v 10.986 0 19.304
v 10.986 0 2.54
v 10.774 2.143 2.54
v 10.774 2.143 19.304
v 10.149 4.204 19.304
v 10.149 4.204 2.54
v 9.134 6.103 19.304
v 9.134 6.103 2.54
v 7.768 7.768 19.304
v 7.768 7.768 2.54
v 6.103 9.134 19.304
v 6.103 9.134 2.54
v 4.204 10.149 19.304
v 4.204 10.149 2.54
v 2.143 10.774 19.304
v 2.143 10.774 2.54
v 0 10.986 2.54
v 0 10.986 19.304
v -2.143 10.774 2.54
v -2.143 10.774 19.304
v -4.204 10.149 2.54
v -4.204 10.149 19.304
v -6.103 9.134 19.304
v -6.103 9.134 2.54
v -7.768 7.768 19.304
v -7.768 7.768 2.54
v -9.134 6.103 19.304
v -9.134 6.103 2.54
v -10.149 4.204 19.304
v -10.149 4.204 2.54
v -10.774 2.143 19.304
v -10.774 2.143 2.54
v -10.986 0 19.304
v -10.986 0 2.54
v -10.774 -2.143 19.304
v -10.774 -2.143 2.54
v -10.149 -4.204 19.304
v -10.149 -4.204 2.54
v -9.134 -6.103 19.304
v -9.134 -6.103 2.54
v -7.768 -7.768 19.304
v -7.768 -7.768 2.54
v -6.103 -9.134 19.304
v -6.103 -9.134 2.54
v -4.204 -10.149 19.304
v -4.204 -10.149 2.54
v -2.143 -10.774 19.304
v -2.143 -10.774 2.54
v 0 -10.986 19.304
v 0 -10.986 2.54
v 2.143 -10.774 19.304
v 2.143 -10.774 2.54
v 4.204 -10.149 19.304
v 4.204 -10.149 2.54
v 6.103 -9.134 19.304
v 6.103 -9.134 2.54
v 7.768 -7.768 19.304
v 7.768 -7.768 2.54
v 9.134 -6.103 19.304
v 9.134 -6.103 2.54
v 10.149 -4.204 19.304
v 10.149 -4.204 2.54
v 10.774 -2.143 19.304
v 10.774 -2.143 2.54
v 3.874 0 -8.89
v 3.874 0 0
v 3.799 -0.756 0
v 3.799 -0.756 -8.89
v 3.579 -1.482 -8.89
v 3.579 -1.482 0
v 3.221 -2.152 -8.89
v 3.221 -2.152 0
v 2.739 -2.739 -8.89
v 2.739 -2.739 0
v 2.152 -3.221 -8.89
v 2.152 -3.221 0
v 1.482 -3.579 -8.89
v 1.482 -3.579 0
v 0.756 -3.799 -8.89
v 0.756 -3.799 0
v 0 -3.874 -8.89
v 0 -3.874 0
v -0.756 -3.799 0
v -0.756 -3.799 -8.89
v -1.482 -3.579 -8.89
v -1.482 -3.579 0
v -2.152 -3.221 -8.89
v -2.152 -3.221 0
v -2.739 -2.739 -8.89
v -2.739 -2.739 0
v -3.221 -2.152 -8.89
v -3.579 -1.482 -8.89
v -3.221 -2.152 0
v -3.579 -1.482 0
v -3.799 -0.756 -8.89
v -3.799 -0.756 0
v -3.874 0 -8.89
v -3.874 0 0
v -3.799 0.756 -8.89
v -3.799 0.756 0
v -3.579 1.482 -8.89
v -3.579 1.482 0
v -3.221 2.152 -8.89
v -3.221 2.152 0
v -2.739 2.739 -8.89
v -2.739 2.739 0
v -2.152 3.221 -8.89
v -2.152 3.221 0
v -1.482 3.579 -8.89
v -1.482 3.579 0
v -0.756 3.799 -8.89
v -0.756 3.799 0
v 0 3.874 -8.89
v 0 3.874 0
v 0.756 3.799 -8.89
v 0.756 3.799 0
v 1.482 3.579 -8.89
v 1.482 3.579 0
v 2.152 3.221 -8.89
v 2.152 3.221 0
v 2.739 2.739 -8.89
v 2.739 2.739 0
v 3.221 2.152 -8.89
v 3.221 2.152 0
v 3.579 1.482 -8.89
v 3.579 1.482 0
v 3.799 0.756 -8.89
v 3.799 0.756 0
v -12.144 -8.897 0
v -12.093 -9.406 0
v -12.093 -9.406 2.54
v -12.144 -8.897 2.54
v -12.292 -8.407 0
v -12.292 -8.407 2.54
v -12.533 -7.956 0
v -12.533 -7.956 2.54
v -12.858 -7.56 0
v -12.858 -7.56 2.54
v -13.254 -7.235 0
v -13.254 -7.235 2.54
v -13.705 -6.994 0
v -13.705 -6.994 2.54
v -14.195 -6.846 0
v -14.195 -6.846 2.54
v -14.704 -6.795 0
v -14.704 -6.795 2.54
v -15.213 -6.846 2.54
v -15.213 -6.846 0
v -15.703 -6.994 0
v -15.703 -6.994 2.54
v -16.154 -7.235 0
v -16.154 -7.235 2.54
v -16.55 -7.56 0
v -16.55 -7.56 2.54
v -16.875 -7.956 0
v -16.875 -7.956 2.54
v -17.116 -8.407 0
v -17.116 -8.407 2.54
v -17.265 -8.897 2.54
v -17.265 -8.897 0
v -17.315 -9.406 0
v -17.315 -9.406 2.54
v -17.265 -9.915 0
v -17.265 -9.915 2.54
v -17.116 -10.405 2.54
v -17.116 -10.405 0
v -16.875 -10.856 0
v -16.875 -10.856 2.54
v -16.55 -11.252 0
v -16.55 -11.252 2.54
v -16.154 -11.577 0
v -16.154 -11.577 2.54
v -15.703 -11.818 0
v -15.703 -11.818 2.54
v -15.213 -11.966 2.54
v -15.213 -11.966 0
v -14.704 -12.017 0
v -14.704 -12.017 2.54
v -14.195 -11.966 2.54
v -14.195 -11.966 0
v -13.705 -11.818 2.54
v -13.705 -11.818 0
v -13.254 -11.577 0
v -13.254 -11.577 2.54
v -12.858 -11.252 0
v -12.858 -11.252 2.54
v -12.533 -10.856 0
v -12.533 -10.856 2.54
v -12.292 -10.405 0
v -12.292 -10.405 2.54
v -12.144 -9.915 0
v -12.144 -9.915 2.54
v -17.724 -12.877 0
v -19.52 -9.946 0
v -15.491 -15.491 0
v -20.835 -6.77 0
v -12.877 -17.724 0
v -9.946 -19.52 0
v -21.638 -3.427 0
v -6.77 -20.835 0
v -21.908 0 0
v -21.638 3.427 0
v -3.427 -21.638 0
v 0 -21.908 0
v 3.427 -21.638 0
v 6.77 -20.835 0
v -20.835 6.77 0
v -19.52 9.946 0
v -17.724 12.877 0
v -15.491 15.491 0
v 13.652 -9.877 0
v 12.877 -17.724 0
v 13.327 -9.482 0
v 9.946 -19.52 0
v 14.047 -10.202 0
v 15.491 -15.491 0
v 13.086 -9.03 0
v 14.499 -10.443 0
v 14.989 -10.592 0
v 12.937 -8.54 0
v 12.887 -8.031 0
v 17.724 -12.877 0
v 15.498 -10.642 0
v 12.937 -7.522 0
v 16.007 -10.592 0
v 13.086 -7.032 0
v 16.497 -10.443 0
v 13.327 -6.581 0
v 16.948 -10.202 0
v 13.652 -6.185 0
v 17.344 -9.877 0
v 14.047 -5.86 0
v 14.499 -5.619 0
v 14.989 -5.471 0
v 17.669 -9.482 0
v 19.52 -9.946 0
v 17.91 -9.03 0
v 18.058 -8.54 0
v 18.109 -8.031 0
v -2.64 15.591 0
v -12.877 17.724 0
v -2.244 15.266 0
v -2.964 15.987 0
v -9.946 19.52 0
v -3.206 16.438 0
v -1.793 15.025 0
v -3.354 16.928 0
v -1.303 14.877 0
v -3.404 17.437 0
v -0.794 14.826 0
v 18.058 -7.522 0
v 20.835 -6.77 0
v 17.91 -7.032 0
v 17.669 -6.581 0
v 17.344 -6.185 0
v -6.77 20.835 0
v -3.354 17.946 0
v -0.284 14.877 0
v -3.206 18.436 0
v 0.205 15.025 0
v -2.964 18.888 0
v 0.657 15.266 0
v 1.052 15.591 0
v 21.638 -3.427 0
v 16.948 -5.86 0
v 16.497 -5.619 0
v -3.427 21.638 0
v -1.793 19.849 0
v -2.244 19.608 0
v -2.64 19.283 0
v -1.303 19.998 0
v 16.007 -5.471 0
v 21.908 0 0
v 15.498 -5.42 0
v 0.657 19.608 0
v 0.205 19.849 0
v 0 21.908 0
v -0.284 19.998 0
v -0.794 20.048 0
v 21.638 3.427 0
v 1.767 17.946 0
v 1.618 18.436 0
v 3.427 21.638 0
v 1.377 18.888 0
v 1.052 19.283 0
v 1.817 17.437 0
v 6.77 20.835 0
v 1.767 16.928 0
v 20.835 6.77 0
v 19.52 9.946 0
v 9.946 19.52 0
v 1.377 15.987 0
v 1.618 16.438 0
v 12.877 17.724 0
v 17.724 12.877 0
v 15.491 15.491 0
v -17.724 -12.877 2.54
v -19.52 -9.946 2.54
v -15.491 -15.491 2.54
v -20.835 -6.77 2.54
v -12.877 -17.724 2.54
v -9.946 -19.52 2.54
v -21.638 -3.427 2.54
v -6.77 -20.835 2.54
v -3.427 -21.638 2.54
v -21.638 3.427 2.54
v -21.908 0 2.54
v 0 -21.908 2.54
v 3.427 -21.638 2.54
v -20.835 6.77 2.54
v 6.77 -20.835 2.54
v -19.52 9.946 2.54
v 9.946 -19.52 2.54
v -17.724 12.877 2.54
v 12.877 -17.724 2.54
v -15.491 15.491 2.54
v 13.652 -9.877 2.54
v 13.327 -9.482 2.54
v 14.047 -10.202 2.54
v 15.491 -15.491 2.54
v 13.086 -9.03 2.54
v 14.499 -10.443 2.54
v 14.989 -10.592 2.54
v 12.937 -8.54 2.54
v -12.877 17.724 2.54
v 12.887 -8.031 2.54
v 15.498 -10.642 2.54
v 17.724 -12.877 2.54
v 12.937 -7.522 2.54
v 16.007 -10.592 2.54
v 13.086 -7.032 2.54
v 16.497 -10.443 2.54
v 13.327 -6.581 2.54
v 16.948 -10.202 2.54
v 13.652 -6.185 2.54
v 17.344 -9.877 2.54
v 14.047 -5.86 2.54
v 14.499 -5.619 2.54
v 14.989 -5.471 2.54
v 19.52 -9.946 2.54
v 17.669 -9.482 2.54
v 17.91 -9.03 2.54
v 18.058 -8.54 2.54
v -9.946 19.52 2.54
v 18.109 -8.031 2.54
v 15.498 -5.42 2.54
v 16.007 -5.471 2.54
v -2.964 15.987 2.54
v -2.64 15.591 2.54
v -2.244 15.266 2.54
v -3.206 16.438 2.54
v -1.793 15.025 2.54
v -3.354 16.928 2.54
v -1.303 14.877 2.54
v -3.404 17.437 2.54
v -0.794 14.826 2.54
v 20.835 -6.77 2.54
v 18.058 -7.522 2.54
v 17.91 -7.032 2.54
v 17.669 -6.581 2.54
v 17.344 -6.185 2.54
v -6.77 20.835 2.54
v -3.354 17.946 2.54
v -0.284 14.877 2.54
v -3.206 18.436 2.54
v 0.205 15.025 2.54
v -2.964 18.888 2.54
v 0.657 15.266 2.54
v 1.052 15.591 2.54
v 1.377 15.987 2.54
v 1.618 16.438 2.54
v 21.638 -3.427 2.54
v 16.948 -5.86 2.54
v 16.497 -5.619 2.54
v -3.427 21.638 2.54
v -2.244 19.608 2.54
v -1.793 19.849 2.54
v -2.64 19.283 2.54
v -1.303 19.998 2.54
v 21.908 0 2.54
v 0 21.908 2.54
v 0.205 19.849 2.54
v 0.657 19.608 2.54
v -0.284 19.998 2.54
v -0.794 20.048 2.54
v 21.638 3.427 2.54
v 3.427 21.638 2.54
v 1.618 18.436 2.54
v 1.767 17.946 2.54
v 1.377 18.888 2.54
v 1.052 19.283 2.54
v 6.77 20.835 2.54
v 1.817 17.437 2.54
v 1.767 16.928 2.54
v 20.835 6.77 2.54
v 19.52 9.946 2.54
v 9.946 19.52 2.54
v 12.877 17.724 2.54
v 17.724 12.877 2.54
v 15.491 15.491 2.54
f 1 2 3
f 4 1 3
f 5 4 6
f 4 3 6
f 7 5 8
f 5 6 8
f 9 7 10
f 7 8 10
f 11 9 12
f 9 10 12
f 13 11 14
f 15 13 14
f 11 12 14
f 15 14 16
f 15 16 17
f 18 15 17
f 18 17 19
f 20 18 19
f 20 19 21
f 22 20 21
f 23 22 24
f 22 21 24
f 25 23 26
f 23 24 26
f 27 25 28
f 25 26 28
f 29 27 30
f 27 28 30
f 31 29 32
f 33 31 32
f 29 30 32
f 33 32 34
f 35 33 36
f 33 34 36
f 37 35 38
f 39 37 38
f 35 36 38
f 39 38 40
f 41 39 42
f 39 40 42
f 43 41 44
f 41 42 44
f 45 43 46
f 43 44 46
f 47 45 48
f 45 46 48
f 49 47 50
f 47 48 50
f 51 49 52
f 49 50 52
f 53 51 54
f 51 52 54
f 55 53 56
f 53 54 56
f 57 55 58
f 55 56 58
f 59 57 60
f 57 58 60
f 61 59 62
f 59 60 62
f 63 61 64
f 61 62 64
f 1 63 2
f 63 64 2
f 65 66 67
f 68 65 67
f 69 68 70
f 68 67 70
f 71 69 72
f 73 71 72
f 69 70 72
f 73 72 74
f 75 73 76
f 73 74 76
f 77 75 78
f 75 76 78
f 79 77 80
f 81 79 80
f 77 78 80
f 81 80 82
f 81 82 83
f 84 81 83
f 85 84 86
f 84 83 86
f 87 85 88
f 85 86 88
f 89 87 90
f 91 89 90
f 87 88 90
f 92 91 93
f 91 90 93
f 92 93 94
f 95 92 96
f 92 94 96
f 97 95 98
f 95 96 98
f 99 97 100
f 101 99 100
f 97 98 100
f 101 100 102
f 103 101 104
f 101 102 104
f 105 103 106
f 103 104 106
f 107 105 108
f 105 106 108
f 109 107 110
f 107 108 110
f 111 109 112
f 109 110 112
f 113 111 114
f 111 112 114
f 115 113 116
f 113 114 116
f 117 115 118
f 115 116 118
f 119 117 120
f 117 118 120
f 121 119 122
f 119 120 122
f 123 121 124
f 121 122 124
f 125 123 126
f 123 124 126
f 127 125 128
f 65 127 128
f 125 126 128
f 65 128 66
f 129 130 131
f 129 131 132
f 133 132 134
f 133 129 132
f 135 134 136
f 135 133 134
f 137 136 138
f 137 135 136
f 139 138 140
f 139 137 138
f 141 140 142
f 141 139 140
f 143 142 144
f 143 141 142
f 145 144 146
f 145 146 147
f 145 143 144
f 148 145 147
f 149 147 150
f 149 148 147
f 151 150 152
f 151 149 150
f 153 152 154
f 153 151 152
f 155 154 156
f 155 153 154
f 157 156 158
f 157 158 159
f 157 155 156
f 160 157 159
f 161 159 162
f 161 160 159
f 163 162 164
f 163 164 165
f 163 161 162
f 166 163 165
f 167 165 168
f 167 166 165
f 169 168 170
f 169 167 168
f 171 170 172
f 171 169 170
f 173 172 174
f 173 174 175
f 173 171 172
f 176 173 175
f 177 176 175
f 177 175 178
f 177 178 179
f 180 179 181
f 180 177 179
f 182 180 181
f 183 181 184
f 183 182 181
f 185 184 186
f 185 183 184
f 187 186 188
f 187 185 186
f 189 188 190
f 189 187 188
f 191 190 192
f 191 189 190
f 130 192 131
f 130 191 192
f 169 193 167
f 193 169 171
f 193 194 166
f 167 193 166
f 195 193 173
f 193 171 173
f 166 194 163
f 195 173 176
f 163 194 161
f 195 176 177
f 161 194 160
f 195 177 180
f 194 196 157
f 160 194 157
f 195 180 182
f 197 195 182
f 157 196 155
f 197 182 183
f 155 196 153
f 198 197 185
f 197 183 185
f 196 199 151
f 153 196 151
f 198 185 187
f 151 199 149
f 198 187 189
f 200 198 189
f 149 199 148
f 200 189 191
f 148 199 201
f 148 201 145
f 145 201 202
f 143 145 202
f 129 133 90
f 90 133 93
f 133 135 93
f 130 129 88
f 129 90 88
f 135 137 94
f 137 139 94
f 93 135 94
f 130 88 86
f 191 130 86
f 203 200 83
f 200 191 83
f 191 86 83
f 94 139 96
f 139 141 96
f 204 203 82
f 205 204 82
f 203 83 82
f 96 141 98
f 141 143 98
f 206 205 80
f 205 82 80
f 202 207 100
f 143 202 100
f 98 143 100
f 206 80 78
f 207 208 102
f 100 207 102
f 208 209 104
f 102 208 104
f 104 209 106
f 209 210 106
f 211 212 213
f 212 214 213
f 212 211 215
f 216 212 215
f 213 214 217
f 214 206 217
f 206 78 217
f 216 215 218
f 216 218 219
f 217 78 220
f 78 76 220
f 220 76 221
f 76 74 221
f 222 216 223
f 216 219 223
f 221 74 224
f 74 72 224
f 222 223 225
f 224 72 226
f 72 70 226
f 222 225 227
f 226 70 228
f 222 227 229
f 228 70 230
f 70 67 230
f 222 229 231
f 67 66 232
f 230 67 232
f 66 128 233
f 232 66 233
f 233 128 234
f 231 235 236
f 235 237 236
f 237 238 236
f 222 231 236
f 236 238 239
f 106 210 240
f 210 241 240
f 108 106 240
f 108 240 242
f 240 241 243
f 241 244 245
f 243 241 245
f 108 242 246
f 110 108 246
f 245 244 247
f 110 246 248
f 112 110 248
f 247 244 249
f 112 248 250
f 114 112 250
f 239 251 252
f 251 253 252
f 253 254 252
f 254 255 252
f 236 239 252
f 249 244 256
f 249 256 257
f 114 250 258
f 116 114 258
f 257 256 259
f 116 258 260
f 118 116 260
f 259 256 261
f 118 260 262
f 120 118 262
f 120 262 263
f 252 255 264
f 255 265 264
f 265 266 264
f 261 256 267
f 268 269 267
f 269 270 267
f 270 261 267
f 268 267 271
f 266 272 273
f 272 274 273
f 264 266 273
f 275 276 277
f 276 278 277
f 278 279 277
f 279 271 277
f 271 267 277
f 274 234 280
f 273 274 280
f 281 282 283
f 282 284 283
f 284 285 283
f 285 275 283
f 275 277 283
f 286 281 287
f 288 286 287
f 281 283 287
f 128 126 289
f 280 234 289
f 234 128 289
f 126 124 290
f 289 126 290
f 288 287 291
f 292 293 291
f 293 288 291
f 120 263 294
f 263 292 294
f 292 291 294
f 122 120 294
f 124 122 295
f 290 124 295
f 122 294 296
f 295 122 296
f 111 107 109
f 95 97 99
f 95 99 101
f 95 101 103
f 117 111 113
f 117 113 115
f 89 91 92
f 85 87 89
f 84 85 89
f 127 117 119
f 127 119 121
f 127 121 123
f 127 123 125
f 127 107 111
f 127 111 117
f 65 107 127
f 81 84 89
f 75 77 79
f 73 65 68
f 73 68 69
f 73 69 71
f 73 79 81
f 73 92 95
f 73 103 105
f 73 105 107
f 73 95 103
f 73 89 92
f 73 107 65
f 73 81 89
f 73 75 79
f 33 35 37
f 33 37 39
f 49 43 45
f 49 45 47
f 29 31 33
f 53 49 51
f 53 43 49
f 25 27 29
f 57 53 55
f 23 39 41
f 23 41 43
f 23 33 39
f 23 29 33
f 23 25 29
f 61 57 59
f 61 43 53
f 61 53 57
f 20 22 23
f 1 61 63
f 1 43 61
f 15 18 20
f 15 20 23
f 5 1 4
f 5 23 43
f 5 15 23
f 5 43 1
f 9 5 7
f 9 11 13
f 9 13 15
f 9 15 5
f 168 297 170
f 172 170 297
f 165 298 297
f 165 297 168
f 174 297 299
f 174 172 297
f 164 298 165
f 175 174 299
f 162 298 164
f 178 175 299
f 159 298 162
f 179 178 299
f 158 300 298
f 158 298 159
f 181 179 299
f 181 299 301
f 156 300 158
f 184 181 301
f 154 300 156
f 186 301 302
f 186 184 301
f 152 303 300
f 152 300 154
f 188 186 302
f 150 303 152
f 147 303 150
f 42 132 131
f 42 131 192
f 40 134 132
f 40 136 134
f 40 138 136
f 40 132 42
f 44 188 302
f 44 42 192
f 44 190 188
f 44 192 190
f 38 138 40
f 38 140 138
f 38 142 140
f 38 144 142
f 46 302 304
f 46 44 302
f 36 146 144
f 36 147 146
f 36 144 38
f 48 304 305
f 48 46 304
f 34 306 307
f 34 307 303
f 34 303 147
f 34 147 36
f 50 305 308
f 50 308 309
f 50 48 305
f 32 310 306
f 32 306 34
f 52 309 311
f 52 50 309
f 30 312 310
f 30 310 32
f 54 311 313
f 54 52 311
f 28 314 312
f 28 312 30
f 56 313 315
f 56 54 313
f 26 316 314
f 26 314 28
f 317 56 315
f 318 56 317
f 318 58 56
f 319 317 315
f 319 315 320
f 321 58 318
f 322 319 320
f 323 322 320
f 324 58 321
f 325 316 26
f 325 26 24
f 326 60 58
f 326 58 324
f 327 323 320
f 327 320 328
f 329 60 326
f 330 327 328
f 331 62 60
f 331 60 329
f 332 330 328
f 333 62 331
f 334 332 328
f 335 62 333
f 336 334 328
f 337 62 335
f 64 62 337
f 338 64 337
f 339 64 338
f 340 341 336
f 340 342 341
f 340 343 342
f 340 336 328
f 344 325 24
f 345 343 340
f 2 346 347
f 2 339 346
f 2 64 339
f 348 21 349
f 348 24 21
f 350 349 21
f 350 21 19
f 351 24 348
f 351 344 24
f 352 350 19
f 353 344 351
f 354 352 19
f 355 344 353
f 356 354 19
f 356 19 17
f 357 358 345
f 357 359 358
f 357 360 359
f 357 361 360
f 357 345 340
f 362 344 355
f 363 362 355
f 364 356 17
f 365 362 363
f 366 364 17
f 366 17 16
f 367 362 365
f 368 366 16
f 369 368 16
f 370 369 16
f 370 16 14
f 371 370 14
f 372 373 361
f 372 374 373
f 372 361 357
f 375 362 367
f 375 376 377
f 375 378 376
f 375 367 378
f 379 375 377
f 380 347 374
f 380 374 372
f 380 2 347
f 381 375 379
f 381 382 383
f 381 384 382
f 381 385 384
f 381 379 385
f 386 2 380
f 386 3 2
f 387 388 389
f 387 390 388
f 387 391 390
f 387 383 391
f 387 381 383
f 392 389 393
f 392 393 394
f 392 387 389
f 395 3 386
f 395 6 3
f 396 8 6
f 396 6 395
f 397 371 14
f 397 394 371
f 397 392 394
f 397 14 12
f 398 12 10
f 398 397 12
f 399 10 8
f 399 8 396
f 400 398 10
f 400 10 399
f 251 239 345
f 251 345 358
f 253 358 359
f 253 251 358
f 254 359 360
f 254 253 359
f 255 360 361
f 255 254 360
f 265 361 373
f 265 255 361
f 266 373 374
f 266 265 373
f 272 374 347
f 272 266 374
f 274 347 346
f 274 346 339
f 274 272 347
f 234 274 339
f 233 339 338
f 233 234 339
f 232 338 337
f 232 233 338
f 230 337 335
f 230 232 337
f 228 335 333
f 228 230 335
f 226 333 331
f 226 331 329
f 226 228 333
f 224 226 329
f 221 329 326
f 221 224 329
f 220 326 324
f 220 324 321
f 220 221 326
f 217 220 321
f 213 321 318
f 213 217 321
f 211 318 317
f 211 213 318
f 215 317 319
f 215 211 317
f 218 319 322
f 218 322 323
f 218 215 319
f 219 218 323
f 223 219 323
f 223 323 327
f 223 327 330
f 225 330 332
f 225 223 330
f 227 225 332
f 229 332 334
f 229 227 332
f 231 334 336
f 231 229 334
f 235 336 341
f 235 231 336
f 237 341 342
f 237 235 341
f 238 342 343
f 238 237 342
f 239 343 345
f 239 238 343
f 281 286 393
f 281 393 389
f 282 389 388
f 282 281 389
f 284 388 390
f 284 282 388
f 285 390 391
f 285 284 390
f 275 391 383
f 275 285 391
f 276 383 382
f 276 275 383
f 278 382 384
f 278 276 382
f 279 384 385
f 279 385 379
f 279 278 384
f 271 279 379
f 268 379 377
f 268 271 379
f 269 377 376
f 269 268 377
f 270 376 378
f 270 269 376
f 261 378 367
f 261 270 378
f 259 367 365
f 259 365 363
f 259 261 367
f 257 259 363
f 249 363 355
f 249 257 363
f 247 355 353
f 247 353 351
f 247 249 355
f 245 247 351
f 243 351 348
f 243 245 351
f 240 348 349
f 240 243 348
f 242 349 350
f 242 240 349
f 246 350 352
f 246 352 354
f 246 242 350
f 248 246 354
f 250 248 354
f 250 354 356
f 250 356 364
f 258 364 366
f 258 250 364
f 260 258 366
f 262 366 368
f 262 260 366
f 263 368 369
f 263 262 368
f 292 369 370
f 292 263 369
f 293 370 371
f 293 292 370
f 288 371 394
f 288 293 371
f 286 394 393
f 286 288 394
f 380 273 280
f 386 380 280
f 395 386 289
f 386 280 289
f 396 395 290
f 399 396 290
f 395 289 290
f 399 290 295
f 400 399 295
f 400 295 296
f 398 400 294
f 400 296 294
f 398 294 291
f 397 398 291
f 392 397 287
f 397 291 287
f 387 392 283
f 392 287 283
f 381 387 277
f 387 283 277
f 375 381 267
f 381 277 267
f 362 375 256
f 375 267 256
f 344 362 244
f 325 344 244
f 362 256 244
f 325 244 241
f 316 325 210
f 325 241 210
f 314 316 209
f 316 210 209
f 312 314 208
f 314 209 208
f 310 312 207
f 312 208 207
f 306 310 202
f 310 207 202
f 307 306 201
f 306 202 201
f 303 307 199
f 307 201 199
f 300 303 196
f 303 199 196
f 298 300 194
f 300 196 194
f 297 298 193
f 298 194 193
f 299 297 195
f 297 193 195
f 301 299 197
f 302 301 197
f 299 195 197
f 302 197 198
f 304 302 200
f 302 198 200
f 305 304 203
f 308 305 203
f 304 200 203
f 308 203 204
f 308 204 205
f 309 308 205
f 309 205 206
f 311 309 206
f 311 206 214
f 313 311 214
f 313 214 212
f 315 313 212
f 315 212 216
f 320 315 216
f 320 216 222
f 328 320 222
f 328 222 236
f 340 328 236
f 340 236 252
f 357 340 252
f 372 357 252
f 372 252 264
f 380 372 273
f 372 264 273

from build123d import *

# Parameters (mm, degrees)
SKETCH1_R           = 21.9075
SKETCH1_R_2         = 2.610660844
BOSS_EXTRUDE1_DEPTH = 2.54
SKETCH2_R           = 3.8735
BOSS_EXTRUDE2_DEPTH = 8.89
SKETCH3_R           = 10.9855
BOSS_EXTRUDE4_DEPTH = 16.764


with BuildPart() as part:
    # Sketch1 → Boss-Extrude1 (new body)
    with BuildSketch(Plane.XY):
        Circle(SKETCH1_R)
        with Locations((-0.793799024, 17.4371)):
            Circle(SKETCH1_R_2, mode=Mode.SUBTRACT)
        with Locations((15.49787108, -8.03109988)):
            Circle(SKETCH1_R_2, mode=Mode.SUBTRACT)
        with Locations((-14.704072056, -9.40600012)):
            Circle(SKETCH1_R_2, mode=Mode.SUBTRACT)
    extrude(amount=BOSS_EXTRUDE1_DEPTH)

    # Sketch2 → Boss-Extrude2 (add)
    with BuildSketch(Plane(origin=(0, 0, 0), x_dir=(-1, 0, 0), z_dir=(0, 0, -1))):
        with Locations(Location((0, 0, 0), (0, 0, 180))):
            Circle(SKETCH2_R)
    extrude(amount=BOSS_EXTRUDE2_DEPTH)

    # Sketch3 → Boss-Extrude4 (add)
    with BuildSketch(Plane.XY.offset(2.54)):
        Circle(SKETCH3_R)
    extrude(amount=BOSS_EXTRUDE4_DEPTH)


solid = part.part
